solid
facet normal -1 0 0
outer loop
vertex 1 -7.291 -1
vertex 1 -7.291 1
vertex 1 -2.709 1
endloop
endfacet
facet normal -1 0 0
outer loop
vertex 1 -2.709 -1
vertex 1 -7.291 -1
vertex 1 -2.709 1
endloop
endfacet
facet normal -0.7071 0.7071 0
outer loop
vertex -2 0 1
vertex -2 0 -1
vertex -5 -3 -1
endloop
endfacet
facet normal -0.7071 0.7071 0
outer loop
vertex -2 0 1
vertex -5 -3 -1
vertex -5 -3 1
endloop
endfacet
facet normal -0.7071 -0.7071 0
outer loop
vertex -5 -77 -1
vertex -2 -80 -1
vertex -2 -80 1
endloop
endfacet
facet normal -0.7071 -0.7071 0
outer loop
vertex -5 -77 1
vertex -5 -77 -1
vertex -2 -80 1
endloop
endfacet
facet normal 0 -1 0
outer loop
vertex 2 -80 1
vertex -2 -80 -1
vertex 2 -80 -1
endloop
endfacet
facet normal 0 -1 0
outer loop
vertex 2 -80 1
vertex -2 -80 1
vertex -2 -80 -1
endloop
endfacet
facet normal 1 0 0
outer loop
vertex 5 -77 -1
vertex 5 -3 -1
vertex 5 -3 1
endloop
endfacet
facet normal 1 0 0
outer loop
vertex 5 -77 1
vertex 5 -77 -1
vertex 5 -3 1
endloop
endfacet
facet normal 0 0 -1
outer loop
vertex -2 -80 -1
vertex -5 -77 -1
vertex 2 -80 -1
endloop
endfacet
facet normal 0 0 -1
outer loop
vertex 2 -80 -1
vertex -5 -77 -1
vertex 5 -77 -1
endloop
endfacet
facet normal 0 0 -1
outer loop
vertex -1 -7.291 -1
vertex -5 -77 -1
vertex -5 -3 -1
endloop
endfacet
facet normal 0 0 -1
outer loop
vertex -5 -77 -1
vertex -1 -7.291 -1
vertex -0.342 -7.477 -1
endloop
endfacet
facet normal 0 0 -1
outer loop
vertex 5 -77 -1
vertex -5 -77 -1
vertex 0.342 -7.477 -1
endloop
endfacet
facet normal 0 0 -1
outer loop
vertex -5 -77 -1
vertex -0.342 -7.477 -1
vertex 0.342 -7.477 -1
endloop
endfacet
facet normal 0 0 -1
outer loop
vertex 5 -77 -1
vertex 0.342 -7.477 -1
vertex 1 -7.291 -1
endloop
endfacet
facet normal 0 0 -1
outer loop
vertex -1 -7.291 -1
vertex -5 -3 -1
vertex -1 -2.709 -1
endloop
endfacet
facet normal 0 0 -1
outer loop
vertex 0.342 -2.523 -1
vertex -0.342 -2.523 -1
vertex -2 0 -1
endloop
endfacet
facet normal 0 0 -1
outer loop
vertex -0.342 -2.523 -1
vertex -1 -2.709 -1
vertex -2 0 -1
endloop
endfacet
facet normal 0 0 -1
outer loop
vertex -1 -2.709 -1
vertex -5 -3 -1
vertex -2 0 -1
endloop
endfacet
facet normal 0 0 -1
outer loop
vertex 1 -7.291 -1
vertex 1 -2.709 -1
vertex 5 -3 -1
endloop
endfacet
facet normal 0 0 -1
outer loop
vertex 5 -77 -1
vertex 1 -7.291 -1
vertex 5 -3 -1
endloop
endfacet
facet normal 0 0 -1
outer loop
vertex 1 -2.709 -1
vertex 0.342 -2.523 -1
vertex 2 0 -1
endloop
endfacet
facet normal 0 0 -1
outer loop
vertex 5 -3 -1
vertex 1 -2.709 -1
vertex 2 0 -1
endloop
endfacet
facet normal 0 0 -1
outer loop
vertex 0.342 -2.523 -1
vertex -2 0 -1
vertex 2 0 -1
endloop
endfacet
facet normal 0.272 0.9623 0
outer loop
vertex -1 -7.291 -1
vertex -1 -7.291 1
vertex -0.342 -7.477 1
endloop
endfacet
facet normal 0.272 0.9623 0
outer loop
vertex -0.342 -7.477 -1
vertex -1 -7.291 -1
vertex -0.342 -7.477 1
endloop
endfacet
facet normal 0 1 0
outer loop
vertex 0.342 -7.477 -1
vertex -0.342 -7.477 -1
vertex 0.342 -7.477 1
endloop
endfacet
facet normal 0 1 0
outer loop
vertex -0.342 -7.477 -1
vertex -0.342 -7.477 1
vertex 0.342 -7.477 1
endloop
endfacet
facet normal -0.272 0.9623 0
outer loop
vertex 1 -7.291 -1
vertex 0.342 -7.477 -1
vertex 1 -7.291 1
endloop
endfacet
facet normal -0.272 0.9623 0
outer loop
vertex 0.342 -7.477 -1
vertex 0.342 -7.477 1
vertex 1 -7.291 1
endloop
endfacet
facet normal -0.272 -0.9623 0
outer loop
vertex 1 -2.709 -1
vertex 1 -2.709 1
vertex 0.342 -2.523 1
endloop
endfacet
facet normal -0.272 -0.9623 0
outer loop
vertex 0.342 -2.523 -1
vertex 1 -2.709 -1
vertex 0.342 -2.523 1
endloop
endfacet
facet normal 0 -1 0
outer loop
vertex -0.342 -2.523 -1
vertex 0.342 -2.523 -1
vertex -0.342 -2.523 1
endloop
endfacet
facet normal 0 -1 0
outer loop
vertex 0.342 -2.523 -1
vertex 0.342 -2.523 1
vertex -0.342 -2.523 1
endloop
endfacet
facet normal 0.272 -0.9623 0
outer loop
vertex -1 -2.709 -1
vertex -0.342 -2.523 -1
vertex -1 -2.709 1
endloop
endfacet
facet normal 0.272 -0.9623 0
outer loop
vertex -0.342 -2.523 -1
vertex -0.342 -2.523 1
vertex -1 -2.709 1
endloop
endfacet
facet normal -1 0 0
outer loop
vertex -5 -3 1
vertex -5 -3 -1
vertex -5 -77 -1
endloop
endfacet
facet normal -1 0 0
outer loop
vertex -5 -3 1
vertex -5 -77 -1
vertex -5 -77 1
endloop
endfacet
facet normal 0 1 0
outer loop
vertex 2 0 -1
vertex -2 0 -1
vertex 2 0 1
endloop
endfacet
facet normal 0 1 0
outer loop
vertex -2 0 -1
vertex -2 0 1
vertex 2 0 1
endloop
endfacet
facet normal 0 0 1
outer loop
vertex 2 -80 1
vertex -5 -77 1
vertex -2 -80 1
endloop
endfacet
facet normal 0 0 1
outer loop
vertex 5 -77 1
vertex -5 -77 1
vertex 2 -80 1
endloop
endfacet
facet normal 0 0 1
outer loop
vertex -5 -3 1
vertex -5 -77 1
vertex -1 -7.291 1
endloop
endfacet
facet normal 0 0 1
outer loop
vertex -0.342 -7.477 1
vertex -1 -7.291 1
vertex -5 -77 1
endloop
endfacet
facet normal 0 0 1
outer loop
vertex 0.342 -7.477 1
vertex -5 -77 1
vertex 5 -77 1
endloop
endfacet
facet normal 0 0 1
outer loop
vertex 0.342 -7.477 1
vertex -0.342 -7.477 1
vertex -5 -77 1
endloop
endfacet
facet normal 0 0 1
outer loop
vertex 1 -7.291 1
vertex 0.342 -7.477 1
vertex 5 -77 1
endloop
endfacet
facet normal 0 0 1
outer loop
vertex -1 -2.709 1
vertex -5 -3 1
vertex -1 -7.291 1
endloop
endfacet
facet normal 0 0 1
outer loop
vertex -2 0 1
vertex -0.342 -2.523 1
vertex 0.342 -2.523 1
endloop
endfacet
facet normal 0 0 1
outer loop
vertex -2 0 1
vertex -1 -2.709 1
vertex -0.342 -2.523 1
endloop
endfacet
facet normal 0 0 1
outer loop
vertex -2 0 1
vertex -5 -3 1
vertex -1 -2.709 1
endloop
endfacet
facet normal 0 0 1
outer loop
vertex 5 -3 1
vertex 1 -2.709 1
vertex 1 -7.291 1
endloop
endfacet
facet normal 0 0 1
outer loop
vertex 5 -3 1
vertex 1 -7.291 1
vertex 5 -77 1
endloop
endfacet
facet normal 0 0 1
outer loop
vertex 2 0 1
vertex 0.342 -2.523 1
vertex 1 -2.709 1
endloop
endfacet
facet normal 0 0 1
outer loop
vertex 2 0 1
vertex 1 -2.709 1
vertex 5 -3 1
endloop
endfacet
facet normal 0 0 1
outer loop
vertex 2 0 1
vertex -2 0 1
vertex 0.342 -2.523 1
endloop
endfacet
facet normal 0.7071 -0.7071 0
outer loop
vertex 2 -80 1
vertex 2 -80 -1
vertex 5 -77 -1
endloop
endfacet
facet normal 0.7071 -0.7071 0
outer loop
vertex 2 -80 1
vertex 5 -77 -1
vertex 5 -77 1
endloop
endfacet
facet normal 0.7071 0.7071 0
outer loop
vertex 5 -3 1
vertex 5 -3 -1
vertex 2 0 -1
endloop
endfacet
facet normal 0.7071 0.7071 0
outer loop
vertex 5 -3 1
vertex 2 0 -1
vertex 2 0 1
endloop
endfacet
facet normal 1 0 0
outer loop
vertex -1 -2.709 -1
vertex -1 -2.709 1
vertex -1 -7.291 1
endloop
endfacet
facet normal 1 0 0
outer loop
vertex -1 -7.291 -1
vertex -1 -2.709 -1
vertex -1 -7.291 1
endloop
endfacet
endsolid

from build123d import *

# Parameters (mm, degrees)
F0_W     = 10
F0_H     = 2
F1_DEPTH = 80
F3_DEPTH = 2
F4_SIZE  = 3


with BuildPart() as f1:
    # F0 (on Front) → F1 (new body)
    with BuildSketch(Plane.XZ):
        Rectangle(F0_W, F0_H)
    extrude(amount=F1_DEPTH)

    # F2 (on face) → F3 (cut, through all)
    with BuildSketch(Plane.XY.offset(1)):
        with BuildLine():
            Line((1, -7.291288), (1, -2.708712))
            ThreePointArc((1, -2.708712), (0, -2.5), (-1, -2.708712))
            Line((-1, -2.708712), (-1, -7.291288))
            ThreePointArc((-1, -7.291288), (0, -7.5), (1, -7.291288))
        make_face()
    extrude(amount=-F3_DEPTH, mode=Mode.SUBTRACT)

    # F4
    f4_edges = [f1.edges().sort_by_distance(p)[0] for p in [
        (-5, 0, 0),
        (5, 0, 0),
        (-5, -80, 0),
        (5, -80, 0),
    ]]
    chamfer(f4_edges, length=F4_SIZE)


solid = f1.part
